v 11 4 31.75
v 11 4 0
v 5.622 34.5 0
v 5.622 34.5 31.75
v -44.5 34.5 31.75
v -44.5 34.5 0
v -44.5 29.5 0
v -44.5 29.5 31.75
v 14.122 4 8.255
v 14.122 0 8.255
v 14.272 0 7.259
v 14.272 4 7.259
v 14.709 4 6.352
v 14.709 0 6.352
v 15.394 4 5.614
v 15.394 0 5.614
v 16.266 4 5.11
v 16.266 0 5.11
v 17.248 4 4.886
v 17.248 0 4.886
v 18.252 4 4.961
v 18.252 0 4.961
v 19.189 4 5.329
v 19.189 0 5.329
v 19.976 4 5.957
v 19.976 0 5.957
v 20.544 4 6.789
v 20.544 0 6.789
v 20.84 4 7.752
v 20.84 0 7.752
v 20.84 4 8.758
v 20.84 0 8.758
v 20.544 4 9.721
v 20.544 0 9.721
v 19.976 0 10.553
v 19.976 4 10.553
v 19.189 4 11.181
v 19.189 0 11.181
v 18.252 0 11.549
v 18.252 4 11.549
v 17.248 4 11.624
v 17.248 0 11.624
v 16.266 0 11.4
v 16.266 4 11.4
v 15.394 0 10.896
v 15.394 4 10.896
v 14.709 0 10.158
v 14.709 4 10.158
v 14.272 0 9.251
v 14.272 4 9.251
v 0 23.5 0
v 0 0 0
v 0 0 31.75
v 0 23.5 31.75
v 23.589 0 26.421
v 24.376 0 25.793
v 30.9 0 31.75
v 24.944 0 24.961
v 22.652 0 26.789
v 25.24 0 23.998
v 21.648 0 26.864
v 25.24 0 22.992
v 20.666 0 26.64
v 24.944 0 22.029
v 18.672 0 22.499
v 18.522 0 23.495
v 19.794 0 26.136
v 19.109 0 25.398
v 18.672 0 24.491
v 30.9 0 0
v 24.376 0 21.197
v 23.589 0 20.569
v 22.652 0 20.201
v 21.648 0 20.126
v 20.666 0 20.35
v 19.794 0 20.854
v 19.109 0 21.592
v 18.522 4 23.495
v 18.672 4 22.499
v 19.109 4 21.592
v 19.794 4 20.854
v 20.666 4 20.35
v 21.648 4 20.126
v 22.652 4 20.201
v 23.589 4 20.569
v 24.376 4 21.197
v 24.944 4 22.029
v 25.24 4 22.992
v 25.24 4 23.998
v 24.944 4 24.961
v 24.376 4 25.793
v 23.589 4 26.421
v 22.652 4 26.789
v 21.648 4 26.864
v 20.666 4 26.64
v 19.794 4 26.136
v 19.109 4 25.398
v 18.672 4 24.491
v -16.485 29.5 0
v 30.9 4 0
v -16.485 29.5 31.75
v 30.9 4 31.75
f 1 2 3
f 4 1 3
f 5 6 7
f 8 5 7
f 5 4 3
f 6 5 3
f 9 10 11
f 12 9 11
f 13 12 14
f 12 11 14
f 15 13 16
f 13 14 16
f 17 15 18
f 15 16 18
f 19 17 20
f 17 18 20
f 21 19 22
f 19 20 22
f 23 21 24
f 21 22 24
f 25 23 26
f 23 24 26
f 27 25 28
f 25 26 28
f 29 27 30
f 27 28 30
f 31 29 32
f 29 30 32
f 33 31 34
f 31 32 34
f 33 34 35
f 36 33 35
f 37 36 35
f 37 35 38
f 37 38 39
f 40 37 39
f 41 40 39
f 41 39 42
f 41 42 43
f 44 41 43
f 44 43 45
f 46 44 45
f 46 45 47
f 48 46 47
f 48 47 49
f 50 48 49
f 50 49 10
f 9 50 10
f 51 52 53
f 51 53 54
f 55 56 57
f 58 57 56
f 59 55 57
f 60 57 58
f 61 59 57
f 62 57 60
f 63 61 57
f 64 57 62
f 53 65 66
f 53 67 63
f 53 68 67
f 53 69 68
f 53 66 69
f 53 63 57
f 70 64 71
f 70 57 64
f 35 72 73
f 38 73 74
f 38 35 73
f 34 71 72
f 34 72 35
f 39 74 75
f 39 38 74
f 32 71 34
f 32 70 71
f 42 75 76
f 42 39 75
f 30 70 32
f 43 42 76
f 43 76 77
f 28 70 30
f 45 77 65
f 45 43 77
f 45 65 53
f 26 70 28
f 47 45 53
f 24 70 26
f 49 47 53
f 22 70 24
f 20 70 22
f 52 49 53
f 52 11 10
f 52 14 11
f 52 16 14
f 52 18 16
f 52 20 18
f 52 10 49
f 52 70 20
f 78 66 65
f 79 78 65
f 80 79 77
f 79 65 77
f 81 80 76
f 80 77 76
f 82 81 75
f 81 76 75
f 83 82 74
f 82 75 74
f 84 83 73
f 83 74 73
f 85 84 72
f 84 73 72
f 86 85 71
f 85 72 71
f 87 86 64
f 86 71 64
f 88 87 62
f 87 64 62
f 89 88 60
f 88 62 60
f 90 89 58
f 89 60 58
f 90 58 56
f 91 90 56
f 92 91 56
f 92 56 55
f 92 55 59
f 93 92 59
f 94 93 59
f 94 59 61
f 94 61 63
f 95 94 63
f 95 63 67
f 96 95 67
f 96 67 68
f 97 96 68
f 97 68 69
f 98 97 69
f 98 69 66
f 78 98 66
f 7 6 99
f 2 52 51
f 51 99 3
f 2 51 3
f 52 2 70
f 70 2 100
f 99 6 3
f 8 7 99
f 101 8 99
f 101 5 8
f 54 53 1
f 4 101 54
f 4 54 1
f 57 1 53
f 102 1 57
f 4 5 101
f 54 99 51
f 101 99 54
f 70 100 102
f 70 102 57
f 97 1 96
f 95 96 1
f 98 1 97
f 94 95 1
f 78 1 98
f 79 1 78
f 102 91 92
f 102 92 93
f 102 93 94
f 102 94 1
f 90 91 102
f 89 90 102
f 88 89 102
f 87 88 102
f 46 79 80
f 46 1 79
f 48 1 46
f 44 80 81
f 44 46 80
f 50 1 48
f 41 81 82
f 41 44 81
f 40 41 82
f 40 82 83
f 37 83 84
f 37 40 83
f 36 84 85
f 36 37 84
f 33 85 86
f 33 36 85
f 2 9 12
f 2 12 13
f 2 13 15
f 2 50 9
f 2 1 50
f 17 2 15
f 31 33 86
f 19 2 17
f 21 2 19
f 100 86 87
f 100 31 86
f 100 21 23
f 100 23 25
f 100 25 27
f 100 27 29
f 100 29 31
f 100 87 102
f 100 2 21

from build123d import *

# Parameters (mm, degrees)
BOSS_EXTRUDE1_DEPTH     = 31.75
F_1_4_CLEARANCE_HOLE1_D = 6.7564
CHAMFER1_SIZE           = 5.5
CHAMFER1_SIZE_2         = 31.192050008
CHAMFER2_SIZE           = 6
CHAMFER2_SIZE2          = 16.484864517


with BuildPart() as part:
    # Sketch1 → Boss-Extrude1 (new body)
    with BuildSketch(Plane.XY):
        Polygon((30.9, 0), (0, 0), (0, 29.5), (5.5, 29.5), (5.5, 4), (30.9, 4), align=None)
        Polygon((-44.5, 29.5), (0, 29.5), (5.5, 29.5), (5.5, 34.5), (-44.5, 34.5), align=None)
    extrude(amount=BOSS_EXTRUDE1_DEPTH)

    # 1/4 Clearance Hole1 (through all)
    with Locations(Plane(origin=(0, 4, 0), x_dir=(1, 0, 0), z_dir=(0, 1, 0))):
        with Locations((21.9, -23.495), (17.5, -8.255)):
            Hole(F_1_4_CLEARANCE_HOLE1_D / 2)

    # Chamfer1
    # the kernel refuses this chamfer: 31.192050008, 5.5 mm, written as the material it adds along each edge
    with BuildSketch(Plane(origin=(5.5, 4, 0), x_dir=(0.9776715712462578, -0.21013876076743532, 0), z_dir=(0, 0, 1))) as chamfer1_piece_1_section:
        Polygon((CHAMFER1_SIZE * 0.977671571246, CHAMFER1_SIZE * 0.210138760767), (-CHAMFER1_SIZE_2 * 0.210138760767, CHAMFER1_SIZE_2 * 0.977671571243), (0, 0), align=None)
    chamfer1_piece_1 = extrude(amount=31.75, mode=Mode.PRIVATE)
    chamfer1_piece_1 = split(chamfer1_piece_1, bisect_by=Plane(origin=(7.01069263, 34.5, 15.875), z_dir=(0, -1, 0)), keep=Keep.TOP, mode=Mode.PRIVATE)
    add(chamfer1_piece_1)

    # Chamfer2
    chamfer2_edges = [part.edges().sort_by_distance(p)[0] for p in [
        (0, 29.5, 15.875),
    ]]
    chamfer2_side = [part.faces().sort_by_distance(p)[0] for p in [
        (0, 14.75, 15.875),
    ]]
    chamfer(chamfer2_edges, length=CHAMFER2_SIZE, length2=CHAMFER2_SIZE2, reference=chamfer2_side[0])


solid = part.part
